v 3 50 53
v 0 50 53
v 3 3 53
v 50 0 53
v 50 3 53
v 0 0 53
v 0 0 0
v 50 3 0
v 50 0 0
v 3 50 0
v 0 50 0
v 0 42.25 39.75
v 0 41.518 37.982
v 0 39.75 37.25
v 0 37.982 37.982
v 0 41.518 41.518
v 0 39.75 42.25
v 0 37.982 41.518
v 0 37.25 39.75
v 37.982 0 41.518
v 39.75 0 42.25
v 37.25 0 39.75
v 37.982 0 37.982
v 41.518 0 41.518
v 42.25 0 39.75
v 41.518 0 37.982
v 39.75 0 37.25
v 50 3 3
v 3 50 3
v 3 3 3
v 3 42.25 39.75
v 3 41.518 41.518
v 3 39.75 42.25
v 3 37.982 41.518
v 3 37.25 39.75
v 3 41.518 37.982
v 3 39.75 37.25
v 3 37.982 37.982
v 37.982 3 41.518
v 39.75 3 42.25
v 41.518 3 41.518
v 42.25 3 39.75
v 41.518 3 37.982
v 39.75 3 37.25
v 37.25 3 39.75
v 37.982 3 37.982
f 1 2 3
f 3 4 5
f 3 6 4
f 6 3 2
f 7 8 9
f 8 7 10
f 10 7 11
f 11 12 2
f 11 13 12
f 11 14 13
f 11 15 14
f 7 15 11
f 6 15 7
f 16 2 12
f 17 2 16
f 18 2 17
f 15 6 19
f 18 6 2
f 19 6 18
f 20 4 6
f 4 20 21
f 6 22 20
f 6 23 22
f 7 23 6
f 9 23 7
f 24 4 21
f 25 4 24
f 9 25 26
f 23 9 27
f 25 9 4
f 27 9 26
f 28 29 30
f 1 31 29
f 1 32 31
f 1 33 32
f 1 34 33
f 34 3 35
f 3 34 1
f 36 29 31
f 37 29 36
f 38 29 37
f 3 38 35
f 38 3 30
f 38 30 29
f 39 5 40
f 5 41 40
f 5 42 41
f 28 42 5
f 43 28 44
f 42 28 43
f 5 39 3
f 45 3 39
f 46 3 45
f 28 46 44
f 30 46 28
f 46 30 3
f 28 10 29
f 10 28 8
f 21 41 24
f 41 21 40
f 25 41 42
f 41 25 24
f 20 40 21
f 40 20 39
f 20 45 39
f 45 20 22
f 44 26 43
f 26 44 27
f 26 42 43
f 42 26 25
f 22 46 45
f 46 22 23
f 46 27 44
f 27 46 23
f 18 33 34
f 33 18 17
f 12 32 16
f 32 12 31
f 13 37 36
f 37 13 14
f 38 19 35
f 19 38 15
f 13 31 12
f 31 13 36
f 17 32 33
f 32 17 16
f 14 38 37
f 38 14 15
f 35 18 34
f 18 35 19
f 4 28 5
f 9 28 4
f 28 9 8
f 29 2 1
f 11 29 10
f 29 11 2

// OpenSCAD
w = 50;
s = 3;

hr = 2.5;
hm = 0.75;

difference() {
cube([w+s,w+s,w+s]);
translate([s,s,s])cube([w,w,w]);
translate([w+s,0,0])rotate([0,0,45])cube([w+s,w*2+s*2,w+s]);
    
translate([(w+s)*hm,2*s,(w+s)*hm])rotate([90,0,0])cylinder(s*9,hr,hr);
translate([0,(w+s)*hm,(w+s)*hm])rotate([0,90,0])cylinder(s*9,hr,hr);
translate([w,0,0])cube([w+s*2,w+s*2,w+s*2]);
translate([0,w,0])cube([w+s*2,w+s*2,w+s*2]);
}
